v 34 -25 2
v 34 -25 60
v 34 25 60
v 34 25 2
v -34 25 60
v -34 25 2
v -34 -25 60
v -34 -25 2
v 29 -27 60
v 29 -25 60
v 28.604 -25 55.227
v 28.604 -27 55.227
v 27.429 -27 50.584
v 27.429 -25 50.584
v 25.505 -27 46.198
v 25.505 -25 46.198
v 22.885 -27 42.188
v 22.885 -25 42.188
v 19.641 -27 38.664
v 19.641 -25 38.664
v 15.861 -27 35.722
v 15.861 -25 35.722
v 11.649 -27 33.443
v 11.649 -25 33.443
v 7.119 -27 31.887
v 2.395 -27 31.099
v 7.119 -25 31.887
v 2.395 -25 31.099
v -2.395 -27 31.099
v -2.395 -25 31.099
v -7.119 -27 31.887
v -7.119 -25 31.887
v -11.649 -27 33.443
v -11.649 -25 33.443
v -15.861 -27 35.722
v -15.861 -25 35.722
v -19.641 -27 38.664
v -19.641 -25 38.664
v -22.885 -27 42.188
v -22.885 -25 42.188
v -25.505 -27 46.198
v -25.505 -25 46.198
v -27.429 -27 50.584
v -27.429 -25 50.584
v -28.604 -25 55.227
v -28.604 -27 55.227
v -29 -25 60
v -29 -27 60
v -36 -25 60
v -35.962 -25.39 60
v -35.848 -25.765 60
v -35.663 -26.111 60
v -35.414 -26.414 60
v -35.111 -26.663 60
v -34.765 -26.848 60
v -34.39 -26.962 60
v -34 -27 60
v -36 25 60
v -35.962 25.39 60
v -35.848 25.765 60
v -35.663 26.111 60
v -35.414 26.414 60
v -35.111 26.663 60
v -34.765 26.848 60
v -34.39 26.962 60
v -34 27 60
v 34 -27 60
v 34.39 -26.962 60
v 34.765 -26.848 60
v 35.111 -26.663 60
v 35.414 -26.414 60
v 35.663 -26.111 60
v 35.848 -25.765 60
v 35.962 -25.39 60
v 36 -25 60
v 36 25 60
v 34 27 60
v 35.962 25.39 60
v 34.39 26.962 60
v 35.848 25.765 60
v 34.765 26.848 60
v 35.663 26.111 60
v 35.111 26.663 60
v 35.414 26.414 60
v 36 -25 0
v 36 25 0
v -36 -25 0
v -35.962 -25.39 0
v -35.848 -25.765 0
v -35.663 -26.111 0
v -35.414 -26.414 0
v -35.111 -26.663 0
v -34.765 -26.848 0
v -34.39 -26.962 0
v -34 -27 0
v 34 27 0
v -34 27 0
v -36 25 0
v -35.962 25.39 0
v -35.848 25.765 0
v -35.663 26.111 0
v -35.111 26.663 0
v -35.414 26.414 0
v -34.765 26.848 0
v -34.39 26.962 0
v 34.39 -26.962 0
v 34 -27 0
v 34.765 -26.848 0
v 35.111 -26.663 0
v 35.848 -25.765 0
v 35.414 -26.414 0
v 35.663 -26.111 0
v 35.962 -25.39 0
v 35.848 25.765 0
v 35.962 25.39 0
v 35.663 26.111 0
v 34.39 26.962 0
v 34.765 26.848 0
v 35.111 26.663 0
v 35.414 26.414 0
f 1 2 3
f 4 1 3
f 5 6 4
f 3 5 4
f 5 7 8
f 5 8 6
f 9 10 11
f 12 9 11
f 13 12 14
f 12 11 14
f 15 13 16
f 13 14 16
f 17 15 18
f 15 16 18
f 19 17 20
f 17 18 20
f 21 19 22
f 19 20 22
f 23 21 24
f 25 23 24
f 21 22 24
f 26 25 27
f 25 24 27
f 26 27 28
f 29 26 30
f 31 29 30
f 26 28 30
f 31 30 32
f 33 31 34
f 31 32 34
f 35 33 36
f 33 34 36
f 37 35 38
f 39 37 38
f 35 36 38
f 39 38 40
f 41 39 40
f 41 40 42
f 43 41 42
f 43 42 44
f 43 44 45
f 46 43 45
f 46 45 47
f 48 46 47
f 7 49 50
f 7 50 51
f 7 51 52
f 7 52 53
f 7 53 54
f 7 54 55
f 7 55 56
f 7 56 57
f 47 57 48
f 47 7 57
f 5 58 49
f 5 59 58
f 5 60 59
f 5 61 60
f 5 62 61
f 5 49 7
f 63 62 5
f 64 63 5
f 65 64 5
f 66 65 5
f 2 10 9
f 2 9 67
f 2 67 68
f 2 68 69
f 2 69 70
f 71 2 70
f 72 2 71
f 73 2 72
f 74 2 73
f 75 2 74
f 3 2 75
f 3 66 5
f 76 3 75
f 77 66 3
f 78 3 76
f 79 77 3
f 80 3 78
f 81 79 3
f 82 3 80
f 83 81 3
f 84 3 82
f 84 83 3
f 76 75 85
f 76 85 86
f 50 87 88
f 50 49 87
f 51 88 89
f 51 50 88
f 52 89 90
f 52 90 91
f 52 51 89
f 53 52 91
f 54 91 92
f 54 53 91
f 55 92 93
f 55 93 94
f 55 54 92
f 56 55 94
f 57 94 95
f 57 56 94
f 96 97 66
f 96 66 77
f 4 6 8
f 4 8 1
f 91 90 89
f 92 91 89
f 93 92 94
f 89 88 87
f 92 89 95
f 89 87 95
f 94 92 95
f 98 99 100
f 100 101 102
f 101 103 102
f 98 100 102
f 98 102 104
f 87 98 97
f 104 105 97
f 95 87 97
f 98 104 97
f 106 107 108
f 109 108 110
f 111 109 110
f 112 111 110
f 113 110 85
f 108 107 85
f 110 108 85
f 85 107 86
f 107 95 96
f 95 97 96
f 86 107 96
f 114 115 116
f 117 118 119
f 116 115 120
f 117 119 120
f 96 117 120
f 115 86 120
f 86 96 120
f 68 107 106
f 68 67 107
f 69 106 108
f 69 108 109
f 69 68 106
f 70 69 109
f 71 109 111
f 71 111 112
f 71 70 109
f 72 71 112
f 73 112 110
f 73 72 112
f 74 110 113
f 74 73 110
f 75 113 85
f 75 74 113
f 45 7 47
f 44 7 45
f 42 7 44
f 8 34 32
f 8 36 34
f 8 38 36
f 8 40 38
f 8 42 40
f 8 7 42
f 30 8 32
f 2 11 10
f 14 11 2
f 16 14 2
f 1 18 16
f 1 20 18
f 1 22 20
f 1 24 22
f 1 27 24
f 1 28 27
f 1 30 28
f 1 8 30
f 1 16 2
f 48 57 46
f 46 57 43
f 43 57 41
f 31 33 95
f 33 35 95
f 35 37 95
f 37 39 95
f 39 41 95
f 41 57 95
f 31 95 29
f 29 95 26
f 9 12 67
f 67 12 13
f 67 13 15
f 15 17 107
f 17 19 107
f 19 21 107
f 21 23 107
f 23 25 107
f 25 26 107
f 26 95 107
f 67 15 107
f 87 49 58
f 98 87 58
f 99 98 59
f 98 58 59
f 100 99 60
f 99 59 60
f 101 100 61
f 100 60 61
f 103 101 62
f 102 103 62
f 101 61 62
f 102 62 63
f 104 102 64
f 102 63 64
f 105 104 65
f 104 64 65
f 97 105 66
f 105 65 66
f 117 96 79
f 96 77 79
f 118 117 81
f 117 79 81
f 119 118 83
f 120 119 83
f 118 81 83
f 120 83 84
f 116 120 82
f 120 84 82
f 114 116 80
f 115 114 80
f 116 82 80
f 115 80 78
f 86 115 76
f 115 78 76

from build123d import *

# Parameters (mm, degrees)
F0_W     = 68
F0_H     = 50
F1_DEPTH = 2
F0_W_2   = 72
F0_H_2   = 54
F2_DEPTH = 60
F4_DEPTH = 25
F5_R     = 2


# Not quite as in the source:
# - a feature names something its author has since deleted; it is built from what else it names


with BuildPart() as f1:
    # F0 (on Top) → F1 (new body)
    with BuildSketch(Plane.XY):
        Rectangle(F0_W, F0_H)
    extrude(amount=F1_DEPTH)

    # F0 (on Top) → F2 (join)
    with BuildSketch(Plane.XY):
        Rectangle(F0_W_2, F0_H_2)
        Rectangle(F0_W, F0_H, mode=Mode.SUBTRACT)
    extrude(amount=F2_DEPTH)

    # F3 (on face) → F4 (cut)
    with BuildSketch(Plane(origin=(0, -25, 0), x_dir=(-1, 0, 0), z_dir=(0, 1, 0))):
        with BuildLine():
            Line((29, 60), (-29, 60))
            ThreePointArc((-29, 60), (0, 31), (29, 60))
        make_face()
    extrude(amount=-F4_DEPTH, mode=Mode.SUBTRACT)

    # F5
    f5_edges = [f1.edges().sort_by_distance(p)[0] for p in [
        (-36, 27, 30),
        (36, 27, 30),
        (-36, -27, 30),
        (36, -27, 30),
    ]]
    fillet(f5_edges, radius=F5_R)


solid = f1.part
